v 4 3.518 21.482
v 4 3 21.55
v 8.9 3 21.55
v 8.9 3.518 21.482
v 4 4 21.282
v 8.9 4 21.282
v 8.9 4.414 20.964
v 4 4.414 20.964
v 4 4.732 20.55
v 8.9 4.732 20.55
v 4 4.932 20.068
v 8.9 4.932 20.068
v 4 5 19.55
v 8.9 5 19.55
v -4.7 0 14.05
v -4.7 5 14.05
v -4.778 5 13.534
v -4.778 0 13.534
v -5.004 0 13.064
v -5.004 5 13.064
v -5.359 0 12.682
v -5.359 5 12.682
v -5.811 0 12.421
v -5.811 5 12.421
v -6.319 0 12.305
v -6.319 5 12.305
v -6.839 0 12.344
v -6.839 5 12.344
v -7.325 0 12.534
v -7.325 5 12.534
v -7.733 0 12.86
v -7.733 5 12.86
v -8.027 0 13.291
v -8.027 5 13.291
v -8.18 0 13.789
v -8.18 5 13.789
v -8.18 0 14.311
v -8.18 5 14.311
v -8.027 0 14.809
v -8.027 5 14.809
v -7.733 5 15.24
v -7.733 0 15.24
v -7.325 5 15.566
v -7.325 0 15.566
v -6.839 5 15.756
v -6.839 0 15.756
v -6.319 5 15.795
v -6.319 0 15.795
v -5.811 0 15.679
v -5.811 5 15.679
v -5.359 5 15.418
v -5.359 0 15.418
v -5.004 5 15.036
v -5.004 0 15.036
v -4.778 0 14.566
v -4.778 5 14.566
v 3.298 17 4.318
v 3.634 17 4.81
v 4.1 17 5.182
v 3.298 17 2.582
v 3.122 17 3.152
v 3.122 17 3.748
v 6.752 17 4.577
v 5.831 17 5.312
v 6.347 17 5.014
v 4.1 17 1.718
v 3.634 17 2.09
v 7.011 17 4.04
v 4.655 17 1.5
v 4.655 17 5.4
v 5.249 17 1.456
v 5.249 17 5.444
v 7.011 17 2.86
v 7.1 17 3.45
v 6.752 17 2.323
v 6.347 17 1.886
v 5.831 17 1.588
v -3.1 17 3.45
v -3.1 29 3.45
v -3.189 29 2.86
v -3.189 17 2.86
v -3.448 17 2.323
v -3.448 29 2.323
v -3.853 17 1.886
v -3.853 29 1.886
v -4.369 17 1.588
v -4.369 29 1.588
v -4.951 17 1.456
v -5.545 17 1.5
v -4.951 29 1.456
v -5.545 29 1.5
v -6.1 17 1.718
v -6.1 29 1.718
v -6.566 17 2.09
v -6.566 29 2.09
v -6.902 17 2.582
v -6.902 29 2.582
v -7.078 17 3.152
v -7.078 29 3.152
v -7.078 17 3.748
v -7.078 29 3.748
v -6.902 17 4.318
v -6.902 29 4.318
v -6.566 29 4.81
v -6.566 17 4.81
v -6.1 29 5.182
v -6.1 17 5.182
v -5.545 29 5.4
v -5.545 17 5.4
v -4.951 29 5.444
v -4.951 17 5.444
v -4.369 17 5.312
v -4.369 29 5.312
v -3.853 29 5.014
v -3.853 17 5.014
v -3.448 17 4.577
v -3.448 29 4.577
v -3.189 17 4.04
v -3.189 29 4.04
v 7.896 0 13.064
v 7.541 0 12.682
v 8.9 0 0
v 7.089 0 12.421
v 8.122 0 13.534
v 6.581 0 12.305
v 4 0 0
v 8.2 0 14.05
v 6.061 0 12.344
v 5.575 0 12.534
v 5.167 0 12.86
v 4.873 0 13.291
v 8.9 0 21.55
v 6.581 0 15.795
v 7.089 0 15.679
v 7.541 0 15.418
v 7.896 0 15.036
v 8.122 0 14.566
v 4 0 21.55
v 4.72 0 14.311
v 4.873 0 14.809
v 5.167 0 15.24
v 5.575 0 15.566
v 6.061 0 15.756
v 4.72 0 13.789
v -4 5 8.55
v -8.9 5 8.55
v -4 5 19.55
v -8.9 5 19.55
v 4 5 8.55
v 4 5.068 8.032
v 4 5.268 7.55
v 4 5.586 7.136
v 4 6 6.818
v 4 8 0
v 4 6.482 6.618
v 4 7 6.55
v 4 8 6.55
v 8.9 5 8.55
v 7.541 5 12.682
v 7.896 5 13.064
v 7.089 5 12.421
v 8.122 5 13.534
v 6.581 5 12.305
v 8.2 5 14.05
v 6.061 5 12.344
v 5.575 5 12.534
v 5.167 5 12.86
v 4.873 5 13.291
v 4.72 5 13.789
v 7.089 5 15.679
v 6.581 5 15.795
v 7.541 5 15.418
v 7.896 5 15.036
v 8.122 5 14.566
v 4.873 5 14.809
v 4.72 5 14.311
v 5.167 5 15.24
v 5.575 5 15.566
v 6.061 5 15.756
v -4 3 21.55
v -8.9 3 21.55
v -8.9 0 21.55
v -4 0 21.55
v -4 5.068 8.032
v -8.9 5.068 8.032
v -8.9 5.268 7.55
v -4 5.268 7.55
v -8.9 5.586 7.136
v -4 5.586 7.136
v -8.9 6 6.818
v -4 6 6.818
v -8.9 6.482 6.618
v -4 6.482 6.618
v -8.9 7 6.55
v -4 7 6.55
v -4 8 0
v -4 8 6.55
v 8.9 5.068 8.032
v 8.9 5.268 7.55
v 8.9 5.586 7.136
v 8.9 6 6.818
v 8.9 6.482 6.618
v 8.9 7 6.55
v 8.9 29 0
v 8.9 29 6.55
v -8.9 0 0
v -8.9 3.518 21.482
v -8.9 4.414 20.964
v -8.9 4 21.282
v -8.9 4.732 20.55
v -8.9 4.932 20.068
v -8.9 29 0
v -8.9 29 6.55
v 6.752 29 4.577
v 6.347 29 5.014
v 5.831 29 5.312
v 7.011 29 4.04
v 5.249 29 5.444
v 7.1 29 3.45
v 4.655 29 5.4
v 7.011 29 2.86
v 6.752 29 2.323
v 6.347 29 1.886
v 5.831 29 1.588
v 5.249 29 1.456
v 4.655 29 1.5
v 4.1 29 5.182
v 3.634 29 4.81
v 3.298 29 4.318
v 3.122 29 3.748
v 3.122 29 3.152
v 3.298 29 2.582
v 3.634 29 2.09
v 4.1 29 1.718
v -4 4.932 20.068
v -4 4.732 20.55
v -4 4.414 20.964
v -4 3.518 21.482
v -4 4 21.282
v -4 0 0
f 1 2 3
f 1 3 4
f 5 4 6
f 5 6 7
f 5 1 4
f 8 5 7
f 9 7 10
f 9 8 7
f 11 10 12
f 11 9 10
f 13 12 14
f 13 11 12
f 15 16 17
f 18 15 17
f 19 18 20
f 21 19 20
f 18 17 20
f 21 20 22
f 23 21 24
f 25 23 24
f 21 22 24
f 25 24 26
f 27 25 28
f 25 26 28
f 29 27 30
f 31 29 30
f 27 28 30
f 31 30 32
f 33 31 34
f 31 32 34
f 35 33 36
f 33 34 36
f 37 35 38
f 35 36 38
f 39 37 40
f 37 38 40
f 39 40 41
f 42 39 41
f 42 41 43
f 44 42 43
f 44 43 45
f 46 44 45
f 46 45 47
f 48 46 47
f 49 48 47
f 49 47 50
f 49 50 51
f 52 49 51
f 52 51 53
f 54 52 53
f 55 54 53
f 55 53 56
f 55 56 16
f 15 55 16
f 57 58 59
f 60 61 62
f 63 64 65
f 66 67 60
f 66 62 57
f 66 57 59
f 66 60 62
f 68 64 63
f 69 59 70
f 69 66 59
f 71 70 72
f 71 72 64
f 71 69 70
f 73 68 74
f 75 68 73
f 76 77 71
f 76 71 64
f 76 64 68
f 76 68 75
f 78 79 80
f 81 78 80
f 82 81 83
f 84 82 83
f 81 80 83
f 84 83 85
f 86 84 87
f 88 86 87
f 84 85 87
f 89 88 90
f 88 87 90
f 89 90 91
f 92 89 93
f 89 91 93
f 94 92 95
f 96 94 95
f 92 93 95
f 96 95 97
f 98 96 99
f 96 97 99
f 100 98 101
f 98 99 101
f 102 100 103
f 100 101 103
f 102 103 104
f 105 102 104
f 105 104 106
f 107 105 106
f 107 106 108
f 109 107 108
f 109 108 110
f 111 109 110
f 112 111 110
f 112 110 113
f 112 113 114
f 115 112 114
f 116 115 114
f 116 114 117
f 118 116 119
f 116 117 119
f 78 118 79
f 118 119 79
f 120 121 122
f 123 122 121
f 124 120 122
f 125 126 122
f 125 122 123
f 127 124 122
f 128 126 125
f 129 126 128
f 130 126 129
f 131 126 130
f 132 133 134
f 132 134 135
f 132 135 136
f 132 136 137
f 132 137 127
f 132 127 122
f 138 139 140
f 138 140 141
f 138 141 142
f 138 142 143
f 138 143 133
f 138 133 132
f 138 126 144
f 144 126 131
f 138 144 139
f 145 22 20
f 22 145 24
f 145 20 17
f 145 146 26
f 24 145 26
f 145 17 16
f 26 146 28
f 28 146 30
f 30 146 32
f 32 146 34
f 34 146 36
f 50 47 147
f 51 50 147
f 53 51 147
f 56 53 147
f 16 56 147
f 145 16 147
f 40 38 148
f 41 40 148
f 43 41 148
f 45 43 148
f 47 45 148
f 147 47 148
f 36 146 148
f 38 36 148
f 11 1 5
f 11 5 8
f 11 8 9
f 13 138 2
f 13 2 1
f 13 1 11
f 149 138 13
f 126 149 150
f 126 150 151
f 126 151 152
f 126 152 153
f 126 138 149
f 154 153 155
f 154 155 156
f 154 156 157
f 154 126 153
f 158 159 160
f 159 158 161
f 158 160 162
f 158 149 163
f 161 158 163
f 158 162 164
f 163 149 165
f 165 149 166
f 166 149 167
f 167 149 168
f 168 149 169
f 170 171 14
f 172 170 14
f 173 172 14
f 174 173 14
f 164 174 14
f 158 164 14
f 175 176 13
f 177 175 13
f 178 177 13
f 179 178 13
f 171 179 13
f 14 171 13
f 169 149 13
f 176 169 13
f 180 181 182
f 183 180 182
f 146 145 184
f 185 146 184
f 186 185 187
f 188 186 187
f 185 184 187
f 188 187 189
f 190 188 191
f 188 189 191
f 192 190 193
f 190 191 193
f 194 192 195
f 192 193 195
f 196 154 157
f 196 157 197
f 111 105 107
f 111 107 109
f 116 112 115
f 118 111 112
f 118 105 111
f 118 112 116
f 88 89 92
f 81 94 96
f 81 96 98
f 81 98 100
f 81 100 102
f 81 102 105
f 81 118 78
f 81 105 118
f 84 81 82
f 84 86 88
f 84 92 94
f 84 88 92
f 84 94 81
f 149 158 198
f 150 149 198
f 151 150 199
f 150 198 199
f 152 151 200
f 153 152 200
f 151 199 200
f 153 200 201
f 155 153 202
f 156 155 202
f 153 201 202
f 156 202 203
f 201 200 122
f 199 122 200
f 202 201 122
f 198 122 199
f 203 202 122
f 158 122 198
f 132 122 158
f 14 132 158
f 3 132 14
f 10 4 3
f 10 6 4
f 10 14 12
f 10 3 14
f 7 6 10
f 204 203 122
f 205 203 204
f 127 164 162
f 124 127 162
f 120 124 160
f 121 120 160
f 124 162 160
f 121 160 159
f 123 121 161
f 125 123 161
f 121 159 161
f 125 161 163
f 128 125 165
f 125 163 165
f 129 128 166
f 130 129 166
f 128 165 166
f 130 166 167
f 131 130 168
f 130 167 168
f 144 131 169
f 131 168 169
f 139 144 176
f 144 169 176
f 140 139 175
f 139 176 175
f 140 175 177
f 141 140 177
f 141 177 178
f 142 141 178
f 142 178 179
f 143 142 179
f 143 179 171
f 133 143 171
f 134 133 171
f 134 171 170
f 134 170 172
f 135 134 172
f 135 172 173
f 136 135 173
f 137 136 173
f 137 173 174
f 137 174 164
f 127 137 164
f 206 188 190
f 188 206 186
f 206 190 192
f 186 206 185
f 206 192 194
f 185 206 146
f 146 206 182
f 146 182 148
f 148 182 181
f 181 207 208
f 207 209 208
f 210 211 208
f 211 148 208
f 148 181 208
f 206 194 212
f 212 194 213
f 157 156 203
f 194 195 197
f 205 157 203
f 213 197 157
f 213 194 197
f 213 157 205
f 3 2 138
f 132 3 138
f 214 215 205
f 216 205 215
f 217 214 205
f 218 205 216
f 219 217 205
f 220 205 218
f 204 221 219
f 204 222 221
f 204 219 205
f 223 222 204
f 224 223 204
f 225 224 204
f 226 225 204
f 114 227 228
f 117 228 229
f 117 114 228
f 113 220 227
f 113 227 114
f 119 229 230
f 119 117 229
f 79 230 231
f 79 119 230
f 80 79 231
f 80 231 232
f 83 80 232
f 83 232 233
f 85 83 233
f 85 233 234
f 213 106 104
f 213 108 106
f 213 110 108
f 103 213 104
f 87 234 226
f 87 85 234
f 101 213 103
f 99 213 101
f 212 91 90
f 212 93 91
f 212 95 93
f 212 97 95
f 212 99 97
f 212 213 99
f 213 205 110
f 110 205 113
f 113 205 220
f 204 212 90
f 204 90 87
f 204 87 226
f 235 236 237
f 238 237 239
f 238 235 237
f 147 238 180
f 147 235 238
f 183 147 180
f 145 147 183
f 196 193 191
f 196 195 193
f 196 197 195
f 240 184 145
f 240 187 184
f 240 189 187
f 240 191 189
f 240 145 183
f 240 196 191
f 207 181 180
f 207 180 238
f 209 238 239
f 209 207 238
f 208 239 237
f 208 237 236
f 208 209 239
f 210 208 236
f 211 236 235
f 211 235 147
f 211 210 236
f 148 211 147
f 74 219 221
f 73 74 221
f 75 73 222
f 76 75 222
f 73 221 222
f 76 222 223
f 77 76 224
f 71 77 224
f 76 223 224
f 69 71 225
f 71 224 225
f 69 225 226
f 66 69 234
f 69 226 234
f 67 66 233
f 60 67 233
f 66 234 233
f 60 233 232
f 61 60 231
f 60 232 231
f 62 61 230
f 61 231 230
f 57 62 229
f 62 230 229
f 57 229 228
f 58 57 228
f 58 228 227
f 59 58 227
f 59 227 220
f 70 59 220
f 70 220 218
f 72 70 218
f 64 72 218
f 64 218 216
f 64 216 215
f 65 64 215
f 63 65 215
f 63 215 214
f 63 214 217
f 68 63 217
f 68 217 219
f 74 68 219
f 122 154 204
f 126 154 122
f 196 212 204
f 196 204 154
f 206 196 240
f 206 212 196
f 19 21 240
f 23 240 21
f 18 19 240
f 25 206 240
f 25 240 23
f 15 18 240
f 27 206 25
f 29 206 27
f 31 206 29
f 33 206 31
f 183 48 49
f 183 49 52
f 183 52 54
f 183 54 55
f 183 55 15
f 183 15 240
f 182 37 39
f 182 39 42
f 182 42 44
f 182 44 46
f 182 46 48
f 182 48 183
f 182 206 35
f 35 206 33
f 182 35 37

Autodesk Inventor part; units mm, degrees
ref_plane "YZ Plane" through (0, 0, 0) normal (1, 0, 0) x (0, 1, 0)
ref_plane "XZ Plane" through (0, 0, 0) normal (0, 1, 0) x (-1, 0, 0)
ref_plane "XY Plane" through (0, 0, 0) normal (0, 0, 1) x (1, 0, 0)
sketch "Boceto1" plane through (0, 0, 0) normal (1, 0, 0) x (0, 1, 0)
  line L0 (27, 0) -> (0, 0)
  line L1 (0, 0) -> (0, 6.55)
  line L2 (0, 6.55) -> (27, 6.55)
  line L3 (27, 6.55) -> (27, 0)
  line L4 (0, 6.55) -> (5, 6.55)
  line L5 (5, 6.55) -> (5, 21.55)
  line L6 (5, 21.55) -> (0, 21.55)
  line L7 (0, 21.55) -> (0, 6.55)
  dimension "d0" = 27
  dimension "d1" = 6.55
  dimension "d2" = 15
  dimension "d3" = 5
extrude "Extrusión1" add sketch "Boceto1" along normal mid plane 17.8
sketch "Boceto3" plane through (8.9, 27, 0) normal (0, 0, -1) x (-1, 0, 0)
  line L0 (4.9, -19) -> (12.9, -19)
  line L1 (12.9, -19) -> (12.9, -27)
  line L2 (12.9, -27) -> (4.9, -27)
  line L3 (4.9, -27) -> (4.9, -19)
  line L4 (0, -27) -> (17.8, -27) projected
  point P0 (8.9, -27)
  point P1 (8.9, -27)
  dimension "d6" = 8
  dimension "d7" = 8
extrude "Extrusión2" cut sketch "Boceto3" against normal through all
sketch "Boceto4" plane through (-8.9, 5, 21.55) normal (0, 1, 0) x (1, 0, 0)
  point P0 (8.9, 21.55)
sketch "Boceto5" plane through (-8.9, 27, 6.55) normal (0, 1, 0) x (1, 0, 0)
  circle A0 centre (3.8, 3.1) radius 2
  circle A1 centre (14, 3.1) radius 2
  line L0 (0, 0) -> (0, 6.55) projected
  line L1 (0, 0) -> (17.8, 0) projected
  line L2 (17.8, 6.55) -> (17.8, 0) projected
  point P0 (8.9, 6.55)
  dimension "d10" = 4
  dimension "d11" = 4
  dimension "d12" = 3.8
  dimension "d13" = 3.1
  dimension "d14" = 3.8
extrude "Extrusión3" cut sketch "Boceto5" against normal blind 10
sketch "Boceto6" plane through (-8.9, 5, 21.55) normal (0, 1, 0) x (1, 0, 0)
  circle A0 centre (2.45, 7.5) radius 1.75
  circle A1 centre (15.35, 7.5) radius 1.75
  line L0 (0, 0) -> (4.9, 0) projected
  line L1 (0, 15) -> (17.8, 15) projected
  line L2 (12.9, 0) -> (17.8, 0) projected
  point P0 (8.9, 21.55)
  point P1 (2.45, 0)
  point P2 (15.35, 0)
  dimension "d17" = 3.5
  dimension "d18" = 3.5
  dimension "d19" = 15
  dimension "d20" = 7.5
  dimension "d21" = 7.5
extrude "Extrusión4" cut sketch "Boceto6" against normal through all
fillet "Empalme1" radius 2 2 edges at (-6.45, 5, 6.55) (6.45, 5, 6.55)
fillet "Empalme2" radius 2 2 edges at (-6.45, 5, 21.55) (6.45, 5, 21.55)
move faces "Desplazar1" translate (0, 2, 0) faces at (1.6196, 27, 0.4882)
equation "\"d11\" = d10"
equation "\"d14\" = d12"
equation "\"d20\" = 0.5 * d19"
equation "\"d21\" = d20"
properties part number "Sujeción de servo a mesa" material "Plástico PC/ABS"
